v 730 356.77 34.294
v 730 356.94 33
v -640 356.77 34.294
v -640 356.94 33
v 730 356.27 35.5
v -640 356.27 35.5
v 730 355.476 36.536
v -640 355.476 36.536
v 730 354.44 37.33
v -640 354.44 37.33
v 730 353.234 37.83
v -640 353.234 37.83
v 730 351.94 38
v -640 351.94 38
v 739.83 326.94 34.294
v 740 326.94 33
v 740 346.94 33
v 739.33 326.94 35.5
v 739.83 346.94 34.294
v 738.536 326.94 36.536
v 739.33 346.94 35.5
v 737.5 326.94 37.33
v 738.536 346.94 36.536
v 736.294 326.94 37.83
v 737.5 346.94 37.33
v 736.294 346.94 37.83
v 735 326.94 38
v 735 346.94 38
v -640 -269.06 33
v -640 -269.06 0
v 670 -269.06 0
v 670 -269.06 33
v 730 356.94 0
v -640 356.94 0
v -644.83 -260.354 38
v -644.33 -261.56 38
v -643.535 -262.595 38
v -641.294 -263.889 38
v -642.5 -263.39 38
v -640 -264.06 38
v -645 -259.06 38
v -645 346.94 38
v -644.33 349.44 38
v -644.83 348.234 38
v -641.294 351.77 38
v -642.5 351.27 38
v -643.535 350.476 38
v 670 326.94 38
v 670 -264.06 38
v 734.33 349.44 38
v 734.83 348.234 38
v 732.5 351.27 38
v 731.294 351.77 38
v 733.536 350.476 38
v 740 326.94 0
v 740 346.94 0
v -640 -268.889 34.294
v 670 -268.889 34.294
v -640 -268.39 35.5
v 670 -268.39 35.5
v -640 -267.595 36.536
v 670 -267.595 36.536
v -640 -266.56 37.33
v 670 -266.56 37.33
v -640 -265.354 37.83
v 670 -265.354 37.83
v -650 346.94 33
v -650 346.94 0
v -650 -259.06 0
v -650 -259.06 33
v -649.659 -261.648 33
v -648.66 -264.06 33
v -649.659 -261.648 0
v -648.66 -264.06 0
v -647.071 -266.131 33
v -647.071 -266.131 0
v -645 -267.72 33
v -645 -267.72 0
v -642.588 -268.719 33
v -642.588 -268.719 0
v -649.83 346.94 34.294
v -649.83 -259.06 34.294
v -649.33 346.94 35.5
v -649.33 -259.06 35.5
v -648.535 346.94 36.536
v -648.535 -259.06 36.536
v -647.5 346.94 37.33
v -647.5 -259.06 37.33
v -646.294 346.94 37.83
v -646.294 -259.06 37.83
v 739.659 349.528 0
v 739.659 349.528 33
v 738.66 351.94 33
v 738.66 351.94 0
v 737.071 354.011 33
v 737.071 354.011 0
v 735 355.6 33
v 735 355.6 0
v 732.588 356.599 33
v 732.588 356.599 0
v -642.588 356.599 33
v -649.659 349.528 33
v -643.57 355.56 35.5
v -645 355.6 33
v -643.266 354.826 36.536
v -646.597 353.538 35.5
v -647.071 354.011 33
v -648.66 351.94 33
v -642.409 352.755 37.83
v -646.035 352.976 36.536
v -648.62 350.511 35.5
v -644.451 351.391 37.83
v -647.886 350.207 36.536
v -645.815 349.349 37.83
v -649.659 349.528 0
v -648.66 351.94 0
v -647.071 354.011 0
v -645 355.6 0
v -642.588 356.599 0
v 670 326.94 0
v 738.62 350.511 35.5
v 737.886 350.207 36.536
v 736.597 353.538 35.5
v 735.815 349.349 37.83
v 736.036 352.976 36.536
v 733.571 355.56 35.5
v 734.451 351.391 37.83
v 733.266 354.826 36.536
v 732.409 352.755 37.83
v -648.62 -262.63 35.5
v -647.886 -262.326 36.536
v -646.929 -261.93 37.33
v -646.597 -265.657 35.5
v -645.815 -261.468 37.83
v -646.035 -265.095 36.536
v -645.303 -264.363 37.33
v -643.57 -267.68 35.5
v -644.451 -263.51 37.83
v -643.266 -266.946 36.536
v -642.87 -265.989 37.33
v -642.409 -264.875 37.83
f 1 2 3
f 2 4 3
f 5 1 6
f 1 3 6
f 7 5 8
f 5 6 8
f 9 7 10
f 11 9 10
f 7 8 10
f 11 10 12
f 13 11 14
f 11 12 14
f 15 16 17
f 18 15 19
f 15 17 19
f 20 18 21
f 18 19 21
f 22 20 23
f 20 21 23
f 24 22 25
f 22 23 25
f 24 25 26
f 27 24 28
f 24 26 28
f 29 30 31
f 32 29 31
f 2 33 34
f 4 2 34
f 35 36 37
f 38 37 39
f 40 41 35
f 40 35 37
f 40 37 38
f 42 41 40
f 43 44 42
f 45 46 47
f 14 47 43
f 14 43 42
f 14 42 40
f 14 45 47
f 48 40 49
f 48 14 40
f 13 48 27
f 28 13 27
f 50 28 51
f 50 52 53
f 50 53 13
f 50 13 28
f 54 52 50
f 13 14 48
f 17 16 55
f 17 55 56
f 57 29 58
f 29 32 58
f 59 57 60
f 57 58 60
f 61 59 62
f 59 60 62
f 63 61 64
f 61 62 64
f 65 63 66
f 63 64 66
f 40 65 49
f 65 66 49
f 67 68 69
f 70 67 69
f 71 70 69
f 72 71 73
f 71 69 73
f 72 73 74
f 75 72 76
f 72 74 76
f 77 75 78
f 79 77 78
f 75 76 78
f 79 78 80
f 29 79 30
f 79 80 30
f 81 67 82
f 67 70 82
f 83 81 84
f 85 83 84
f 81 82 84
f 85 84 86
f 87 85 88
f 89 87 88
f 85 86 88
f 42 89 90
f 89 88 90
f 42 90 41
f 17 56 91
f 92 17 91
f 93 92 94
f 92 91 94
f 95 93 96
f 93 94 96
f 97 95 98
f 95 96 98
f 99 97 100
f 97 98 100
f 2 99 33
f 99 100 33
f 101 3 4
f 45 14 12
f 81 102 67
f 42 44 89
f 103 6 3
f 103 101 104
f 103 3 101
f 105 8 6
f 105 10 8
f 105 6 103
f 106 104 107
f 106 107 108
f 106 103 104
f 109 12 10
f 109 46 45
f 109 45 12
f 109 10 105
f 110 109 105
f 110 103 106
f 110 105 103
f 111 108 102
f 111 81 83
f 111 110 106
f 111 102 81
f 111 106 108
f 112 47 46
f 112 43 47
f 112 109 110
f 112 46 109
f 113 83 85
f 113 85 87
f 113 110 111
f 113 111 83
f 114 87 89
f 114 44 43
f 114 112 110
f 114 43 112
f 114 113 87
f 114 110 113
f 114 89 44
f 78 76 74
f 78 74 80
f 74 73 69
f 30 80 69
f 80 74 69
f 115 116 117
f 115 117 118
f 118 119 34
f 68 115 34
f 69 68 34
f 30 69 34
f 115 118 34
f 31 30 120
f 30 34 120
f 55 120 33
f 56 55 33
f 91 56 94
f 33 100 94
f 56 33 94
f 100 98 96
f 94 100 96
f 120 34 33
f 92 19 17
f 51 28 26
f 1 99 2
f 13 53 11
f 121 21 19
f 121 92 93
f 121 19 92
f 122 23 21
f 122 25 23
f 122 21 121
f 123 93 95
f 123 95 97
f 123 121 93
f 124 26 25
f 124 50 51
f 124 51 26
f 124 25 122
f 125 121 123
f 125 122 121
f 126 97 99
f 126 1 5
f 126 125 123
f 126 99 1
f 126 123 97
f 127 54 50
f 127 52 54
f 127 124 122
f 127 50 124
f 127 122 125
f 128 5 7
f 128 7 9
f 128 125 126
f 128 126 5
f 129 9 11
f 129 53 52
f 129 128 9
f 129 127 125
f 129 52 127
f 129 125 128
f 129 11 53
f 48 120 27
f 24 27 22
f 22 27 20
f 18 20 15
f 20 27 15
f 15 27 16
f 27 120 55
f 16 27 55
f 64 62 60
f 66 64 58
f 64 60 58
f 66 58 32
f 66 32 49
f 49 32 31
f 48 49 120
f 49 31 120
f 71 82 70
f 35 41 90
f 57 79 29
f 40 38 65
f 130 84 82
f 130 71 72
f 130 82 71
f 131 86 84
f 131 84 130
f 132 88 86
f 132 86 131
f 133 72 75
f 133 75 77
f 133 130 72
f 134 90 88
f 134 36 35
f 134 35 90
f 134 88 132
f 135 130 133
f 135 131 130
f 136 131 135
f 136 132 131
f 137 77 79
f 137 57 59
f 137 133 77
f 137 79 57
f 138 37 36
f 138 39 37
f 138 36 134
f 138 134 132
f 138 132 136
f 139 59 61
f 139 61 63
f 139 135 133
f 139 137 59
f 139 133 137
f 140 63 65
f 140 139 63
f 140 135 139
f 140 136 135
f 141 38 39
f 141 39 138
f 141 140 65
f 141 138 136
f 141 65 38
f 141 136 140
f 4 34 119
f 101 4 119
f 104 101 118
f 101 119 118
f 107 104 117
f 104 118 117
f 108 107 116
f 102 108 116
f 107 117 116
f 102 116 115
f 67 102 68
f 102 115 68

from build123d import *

# Parameters (mm, degrees)
F1_DEPTH = 38
F2_R     = 5


with BuildPart() as f1:
    # F0 (on Top) → F1 (new body)
    with BuildSketch(Plane.XY):
        with BuildLine():
            Line((730.000074, 356.940193), (-639.999926, 356.940193))
            ThreePointArc((-639.999926, 356.940193), (-647.070994, 354.011261), (-649.999926, 346.940193))
            Line((-649.999926, 346.940193), (-649.999926, -259.059807))
            ThreePointArc((-649.999926, -259.059807), (-647.070994, -266.130875), (-639.999926, -269.059807))
            Line((-639.999926, -269.059807), (670.000074, -269.059807))
            Line((670.000074, -269.059807), (670.000074, 326.940193))
            Line((670.000074, 326.940193), (740.000074, 326.940193))
            Line((740.000074, 326.940193), (740.000074, 346.940193))
            ThreePointArc((740.000074, 346.940193), (737.071142, 354.011261), (730.000074, 356.940193))
        make_face()
    extrude(amount=F1_DEPTH)

    # F2
    f2_edges = [f1.edges().sort_by_distance(p)[0] for p in [
        (-649.999926, 43.940193, 38),
    ]]
    fillet(f2_edges, radius=F2_R)


solid = f1.part
